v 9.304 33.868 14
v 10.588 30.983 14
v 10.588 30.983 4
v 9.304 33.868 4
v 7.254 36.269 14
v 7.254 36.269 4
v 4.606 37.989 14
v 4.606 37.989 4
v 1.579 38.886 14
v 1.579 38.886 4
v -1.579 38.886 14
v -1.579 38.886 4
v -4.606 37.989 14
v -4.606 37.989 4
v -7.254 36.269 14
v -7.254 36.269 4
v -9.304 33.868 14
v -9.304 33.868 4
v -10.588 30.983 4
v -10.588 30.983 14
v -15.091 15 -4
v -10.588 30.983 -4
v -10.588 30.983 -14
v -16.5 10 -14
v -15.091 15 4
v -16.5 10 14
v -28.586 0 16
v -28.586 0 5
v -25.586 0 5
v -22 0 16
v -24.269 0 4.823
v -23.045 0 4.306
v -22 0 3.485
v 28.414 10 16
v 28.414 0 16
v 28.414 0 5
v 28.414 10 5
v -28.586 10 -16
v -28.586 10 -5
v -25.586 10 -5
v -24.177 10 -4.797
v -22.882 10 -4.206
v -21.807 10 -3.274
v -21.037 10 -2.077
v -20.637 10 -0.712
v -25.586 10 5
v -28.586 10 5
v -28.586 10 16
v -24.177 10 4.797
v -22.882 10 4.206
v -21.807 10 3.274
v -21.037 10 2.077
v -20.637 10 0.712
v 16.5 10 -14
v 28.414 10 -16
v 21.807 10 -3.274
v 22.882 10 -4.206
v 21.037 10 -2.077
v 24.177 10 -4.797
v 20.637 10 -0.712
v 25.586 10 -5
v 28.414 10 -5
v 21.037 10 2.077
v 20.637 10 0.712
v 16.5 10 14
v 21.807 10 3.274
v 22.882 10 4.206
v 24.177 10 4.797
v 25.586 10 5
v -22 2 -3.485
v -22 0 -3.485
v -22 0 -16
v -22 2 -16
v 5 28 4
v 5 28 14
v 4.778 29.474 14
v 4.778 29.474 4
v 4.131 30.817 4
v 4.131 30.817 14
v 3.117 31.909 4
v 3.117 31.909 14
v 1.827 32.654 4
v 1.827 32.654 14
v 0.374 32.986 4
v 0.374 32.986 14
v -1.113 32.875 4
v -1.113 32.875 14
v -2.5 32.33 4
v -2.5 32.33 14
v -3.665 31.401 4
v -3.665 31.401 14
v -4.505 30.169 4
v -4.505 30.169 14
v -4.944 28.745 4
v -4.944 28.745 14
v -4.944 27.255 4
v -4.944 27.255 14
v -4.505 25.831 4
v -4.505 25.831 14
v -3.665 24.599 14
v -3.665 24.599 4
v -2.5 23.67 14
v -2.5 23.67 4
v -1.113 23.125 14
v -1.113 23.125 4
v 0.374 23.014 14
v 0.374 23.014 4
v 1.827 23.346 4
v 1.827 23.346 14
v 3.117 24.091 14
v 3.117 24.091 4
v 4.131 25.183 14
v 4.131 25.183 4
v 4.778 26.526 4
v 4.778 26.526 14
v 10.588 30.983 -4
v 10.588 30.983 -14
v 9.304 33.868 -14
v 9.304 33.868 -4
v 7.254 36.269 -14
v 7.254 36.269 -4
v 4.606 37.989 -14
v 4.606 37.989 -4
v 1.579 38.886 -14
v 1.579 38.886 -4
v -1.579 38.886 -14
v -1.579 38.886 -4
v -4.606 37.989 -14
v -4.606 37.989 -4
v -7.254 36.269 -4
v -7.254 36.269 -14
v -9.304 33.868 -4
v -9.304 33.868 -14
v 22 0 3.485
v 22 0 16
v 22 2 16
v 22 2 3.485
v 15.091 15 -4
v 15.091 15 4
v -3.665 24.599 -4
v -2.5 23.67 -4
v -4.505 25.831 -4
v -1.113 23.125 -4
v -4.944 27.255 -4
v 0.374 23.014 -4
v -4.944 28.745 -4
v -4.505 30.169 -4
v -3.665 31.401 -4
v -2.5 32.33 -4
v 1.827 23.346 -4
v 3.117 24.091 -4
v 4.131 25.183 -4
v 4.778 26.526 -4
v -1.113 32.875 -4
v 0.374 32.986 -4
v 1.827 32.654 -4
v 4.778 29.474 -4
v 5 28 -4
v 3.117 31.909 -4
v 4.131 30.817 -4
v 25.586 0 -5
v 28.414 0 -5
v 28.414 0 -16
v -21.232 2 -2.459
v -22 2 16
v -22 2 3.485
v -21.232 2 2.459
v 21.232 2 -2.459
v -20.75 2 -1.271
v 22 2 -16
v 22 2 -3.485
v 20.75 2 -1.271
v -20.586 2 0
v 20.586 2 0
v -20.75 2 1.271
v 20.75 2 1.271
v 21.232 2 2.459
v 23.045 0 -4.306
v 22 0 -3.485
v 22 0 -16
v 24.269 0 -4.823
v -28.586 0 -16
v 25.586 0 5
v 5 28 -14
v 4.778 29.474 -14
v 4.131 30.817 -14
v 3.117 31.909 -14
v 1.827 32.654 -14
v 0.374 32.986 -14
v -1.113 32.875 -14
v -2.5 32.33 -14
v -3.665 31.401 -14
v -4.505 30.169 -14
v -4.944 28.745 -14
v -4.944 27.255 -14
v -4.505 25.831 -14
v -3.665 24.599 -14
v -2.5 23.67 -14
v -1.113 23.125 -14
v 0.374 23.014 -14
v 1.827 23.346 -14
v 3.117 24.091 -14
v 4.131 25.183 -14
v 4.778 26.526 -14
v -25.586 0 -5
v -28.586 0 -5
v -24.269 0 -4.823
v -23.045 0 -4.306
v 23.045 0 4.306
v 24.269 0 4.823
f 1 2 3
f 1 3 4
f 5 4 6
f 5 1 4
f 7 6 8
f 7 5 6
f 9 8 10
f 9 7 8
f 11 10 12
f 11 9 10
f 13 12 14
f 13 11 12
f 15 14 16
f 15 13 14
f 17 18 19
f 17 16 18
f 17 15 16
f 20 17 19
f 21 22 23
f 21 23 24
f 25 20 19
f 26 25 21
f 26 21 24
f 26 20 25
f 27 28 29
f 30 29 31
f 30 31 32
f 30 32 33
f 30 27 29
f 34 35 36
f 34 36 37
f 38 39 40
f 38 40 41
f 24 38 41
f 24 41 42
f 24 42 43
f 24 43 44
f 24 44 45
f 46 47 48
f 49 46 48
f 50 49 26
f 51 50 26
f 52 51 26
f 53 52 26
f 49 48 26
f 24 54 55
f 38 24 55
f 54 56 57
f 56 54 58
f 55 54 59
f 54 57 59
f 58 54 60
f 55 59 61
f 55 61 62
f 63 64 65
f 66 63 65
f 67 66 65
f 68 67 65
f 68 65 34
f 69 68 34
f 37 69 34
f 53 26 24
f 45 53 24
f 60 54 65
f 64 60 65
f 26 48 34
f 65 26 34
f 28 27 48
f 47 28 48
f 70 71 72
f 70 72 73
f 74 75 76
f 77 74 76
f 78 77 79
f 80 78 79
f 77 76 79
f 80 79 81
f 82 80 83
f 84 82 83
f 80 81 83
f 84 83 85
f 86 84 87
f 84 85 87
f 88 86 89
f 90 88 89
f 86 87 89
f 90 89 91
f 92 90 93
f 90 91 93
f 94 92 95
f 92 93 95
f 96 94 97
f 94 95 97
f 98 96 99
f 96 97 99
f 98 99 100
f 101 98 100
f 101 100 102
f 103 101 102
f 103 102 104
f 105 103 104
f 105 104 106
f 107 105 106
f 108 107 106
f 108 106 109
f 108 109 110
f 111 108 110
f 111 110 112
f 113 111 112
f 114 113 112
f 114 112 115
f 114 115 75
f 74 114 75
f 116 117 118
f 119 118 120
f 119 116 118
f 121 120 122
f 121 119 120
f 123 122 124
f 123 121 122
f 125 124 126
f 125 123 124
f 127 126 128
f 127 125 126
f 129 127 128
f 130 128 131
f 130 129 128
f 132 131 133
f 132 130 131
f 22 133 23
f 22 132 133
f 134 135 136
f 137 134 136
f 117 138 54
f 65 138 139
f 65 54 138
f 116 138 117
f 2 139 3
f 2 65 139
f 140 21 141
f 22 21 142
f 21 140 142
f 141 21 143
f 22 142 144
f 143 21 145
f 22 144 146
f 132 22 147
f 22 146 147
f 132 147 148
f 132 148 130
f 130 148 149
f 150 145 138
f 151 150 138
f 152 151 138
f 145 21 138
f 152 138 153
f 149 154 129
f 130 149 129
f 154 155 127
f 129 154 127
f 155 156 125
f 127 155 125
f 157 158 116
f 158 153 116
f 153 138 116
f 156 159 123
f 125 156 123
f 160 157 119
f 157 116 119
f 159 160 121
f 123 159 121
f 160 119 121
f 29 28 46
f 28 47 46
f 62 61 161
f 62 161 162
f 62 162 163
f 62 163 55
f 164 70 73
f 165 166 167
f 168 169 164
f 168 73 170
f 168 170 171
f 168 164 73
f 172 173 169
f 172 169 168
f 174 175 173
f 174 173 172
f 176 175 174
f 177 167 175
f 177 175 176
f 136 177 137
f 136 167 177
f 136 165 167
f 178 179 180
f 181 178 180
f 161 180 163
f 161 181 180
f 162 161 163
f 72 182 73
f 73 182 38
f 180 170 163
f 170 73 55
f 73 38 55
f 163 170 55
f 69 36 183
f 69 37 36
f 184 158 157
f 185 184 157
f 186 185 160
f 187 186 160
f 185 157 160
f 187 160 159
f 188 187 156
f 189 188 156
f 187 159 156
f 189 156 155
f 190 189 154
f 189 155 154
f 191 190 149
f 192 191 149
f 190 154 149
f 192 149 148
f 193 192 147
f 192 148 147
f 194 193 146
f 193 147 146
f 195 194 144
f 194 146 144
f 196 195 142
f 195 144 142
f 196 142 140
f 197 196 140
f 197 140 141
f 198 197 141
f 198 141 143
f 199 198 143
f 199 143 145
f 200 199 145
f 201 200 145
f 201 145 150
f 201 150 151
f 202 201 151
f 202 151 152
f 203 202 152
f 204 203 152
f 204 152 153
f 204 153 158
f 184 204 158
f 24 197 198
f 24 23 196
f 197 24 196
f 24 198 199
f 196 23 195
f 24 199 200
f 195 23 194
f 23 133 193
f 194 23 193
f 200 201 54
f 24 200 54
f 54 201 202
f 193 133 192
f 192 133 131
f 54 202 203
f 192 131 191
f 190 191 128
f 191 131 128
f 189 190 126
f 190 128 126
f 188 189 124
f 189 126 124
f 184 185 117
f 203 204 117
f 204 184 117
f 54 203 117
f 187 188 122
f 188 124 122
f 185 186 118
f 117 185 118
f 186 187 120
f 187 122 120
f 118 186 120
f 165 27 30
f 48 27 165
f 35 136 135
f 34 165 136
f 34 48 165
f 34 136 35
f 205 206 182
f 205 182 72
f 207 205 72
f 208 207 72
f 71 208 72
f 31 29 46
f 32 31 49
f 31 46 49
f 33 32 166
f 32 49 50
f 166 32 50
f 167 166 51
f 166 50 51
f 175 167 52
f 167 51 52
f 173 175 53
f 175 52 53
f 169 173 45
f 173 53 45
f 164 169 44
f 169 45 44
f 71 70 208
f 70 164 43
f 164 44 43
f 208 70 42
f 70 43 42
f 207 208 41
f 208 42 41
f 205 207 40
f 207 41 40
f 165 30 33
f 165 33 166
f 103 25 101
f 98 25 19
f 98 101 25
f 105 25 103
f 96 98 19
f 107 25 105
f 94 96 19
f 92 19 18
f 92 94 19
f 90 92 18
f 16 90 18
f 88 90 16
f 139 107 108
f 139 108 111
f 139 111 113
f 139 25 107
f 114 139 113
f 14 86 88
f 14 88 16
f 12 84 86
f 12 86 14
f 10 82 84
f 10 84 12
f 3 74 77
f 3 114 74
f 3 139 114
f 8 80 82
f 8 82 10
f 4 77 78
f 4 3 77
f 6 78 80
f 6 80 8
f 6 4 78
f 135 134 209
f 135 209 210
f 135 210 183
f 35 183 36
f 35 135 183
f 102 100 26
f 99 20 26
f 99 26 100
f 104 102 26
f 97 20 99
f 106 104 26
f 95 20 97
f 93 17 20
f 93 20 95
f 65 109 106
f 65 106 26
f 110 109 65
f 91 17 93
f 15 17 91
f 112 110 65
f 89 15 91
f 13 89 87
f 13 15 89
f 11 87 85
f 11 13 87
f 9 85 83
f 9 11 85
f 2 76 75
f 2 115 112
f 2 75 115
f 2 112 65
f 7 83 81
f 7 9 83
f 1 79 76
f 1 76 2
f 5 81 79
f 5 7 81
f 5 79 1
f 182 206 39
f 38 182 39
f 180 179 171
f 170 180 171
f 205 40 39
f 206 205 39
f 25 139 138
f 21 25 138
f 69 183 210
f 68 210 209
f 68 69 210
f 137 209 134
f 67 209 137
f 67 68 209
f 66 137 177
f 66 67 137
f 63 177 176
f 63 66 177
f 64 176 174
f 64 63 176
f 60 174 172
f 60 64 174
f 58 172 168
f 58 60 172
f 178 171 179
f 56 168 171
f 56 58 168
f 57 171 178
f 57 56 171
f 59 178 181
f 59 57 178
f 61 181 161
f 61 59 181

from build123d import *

# Parameters (mm, degrees)
SKETCH_1_W          = 57
SKETCH_1_H          = 10
EXTRUDE_1_DEPTH     = 32
SKETCH_2_R          = 5
SKETCH_2_W          = 57
SKETCH_2_H          = 10
EXTRUDE_4_DEPTH     = 28
SKETCH_2_8_R        = 5
SKETCH_2_8_W        = 57
SKETCH_2_8_H        = 10
EXTRUDE_5_DEPTH     = 28
SKETCH_7_W          = 44
SKETCH_7_H          = 2
CUT_EXTRUDE_1_DEPTH = 58.983945463
CUT_EXTRUDE_3_DEPTH = 51.932680387
SKETCH_9_W          = 8
SKETCH_9_H          = 24
CUT_EXTRUDE_4_DEPTH = 20


with BuildPart() as part:
    # 草图1 → 凸台-拉伸1 (new body)
    with BuildSketch(Plane.XY.offset(16)):
        with Locations((-0.085624559, 5)):
            Rectangle(SKETCH_1_W, SKETCH_1_H)
    extrude(amount=-EXTRUDE_1_DEPTH)

    # 草图2 → 凸台-拉伸4 (add)
    # profile 1 of 2: a face of its own
    with BuildSketch(Plane.XY.offset(14)):
        with BuildLine():
            Line((-16.5, 10), (16.5, 10))
            Line((16.5, 10), (10.58774912, 30.983214471))
            ThreePointArc((10.58774912, 30.983214471), (0, 39), (-10.58774912, 30.983214471))
            Line((-10.58774912, 30.983214471), (-16.5, 10))
        make_face()
        with Locations((0, 28)):
            Circle(SKETCH_2_R, mode=Mode.SUBTRACT)
    # profile 2 of 2: a face of its own
    with BuildSketch(Plane.XY.offset(14)):
        with Locations((-0.085624559, 5)):
            Rectangle(SKETCH_2_W, SKETCH_2_H)
    extrude(amount=-EXTRUDE_4_DEPTH)

    # 草图2<8> → 凸台-拉伸5 (add)
    # profile 1 of 2: a face of its own
    with BuildSketch(Plane.XY.offset(14)):
        with BuildLine():
            Line((-16.5, 10), (16.5, 10))
            Line((16.5, 10), (10.58774912, 30.983214471))
            ThreePointArc((10.58774912, 30.983214471), (0, 39), (-10.58774912, 30.983214471))
            Line((-10.58774912, 30.983214471), (-16.5, 10))
        make_face()
        with Locations((0, 28)):
            Circle(SKETCH_2_8_R, mode=Mode.SUBTRACT)
    # profile 2 of 2: a face of its own
    with BuildSketch(Plane.XY.offset(14)):
        with Locations((-0.085624559, 5)):
            Rectangle(SKETCH_2_8_W, SKETCH_2_8_H)
    extrude(amount=-EXTRUDE_5_DEPTH)

    # 草图7 → 切除-拉伸1 (cut, through all)
    with BuildSketch(Plane.XY.offset(16)):
        with Locations((0, 1)):
            Rectangle(SKETCH_7_W, SKETCH_7_H)
    extrude(amount=-CUT_EXTRUDE_1_DEPTH, mode=Mode.SUBTRACT)

    # 草图8 → 切除-拉伸3 (cut, symmetric)
    with BuildSketch(Plane(origin=(0, 0, 0), x_dir=(1, 0, 0), z_dir=(0, 1, 0))):
        with BuildLine():
            Line((-160.076364947, -5), (-28.585624559, -5))
            Line((-28.585624559, -5), (-25.585624559, -5))
            ThreePointArc((-25.585624559, -5), (-20.585624559, 0), (-25.585624559, 5))
            Line((-25.585624559, 5), (-28.585624559, 5))
            Line((-28.585624559, 5), (-160.076364947, 5))
            Line((-160.076364947, 5), (-423.057845722, 5))
            Line((-423.057845722, 5), (-423.057845722, -5))
            Line((-423.057845722, -5), (-160.076364947, -5))
        make_face()
    cut_extrude_3 = extrude(amount=CUT_EXTRUDE_3_DEPTH, both=True, mode=Mode.SUBTRACT)

    # 镜向1: 切除-拉伸3 across plane
    add(cut_extrude_3.mirror(Plane(origin=(0, 0, 0), x_dir=(0, 0, 1), z_dir=(1, 0, 0))), mode=Mode.SUBTRACT)

    # 草图9 → 切除-拉伸4 (cut, symmetric)
    with BuildSketch(Plane(origin=(0, 0, 0), x_dir=(0, 0, -1), z_dir=(1, 0, 0))):
        with Locations((0, 27)):
            Rectangle(SKETCH_9_W, SKETCH_9_H)
    extrude(amount=CUT_EXTRUDE_4_DEPTH, both=True, mode=Mode.SUBTRACT)


solid = part.part
